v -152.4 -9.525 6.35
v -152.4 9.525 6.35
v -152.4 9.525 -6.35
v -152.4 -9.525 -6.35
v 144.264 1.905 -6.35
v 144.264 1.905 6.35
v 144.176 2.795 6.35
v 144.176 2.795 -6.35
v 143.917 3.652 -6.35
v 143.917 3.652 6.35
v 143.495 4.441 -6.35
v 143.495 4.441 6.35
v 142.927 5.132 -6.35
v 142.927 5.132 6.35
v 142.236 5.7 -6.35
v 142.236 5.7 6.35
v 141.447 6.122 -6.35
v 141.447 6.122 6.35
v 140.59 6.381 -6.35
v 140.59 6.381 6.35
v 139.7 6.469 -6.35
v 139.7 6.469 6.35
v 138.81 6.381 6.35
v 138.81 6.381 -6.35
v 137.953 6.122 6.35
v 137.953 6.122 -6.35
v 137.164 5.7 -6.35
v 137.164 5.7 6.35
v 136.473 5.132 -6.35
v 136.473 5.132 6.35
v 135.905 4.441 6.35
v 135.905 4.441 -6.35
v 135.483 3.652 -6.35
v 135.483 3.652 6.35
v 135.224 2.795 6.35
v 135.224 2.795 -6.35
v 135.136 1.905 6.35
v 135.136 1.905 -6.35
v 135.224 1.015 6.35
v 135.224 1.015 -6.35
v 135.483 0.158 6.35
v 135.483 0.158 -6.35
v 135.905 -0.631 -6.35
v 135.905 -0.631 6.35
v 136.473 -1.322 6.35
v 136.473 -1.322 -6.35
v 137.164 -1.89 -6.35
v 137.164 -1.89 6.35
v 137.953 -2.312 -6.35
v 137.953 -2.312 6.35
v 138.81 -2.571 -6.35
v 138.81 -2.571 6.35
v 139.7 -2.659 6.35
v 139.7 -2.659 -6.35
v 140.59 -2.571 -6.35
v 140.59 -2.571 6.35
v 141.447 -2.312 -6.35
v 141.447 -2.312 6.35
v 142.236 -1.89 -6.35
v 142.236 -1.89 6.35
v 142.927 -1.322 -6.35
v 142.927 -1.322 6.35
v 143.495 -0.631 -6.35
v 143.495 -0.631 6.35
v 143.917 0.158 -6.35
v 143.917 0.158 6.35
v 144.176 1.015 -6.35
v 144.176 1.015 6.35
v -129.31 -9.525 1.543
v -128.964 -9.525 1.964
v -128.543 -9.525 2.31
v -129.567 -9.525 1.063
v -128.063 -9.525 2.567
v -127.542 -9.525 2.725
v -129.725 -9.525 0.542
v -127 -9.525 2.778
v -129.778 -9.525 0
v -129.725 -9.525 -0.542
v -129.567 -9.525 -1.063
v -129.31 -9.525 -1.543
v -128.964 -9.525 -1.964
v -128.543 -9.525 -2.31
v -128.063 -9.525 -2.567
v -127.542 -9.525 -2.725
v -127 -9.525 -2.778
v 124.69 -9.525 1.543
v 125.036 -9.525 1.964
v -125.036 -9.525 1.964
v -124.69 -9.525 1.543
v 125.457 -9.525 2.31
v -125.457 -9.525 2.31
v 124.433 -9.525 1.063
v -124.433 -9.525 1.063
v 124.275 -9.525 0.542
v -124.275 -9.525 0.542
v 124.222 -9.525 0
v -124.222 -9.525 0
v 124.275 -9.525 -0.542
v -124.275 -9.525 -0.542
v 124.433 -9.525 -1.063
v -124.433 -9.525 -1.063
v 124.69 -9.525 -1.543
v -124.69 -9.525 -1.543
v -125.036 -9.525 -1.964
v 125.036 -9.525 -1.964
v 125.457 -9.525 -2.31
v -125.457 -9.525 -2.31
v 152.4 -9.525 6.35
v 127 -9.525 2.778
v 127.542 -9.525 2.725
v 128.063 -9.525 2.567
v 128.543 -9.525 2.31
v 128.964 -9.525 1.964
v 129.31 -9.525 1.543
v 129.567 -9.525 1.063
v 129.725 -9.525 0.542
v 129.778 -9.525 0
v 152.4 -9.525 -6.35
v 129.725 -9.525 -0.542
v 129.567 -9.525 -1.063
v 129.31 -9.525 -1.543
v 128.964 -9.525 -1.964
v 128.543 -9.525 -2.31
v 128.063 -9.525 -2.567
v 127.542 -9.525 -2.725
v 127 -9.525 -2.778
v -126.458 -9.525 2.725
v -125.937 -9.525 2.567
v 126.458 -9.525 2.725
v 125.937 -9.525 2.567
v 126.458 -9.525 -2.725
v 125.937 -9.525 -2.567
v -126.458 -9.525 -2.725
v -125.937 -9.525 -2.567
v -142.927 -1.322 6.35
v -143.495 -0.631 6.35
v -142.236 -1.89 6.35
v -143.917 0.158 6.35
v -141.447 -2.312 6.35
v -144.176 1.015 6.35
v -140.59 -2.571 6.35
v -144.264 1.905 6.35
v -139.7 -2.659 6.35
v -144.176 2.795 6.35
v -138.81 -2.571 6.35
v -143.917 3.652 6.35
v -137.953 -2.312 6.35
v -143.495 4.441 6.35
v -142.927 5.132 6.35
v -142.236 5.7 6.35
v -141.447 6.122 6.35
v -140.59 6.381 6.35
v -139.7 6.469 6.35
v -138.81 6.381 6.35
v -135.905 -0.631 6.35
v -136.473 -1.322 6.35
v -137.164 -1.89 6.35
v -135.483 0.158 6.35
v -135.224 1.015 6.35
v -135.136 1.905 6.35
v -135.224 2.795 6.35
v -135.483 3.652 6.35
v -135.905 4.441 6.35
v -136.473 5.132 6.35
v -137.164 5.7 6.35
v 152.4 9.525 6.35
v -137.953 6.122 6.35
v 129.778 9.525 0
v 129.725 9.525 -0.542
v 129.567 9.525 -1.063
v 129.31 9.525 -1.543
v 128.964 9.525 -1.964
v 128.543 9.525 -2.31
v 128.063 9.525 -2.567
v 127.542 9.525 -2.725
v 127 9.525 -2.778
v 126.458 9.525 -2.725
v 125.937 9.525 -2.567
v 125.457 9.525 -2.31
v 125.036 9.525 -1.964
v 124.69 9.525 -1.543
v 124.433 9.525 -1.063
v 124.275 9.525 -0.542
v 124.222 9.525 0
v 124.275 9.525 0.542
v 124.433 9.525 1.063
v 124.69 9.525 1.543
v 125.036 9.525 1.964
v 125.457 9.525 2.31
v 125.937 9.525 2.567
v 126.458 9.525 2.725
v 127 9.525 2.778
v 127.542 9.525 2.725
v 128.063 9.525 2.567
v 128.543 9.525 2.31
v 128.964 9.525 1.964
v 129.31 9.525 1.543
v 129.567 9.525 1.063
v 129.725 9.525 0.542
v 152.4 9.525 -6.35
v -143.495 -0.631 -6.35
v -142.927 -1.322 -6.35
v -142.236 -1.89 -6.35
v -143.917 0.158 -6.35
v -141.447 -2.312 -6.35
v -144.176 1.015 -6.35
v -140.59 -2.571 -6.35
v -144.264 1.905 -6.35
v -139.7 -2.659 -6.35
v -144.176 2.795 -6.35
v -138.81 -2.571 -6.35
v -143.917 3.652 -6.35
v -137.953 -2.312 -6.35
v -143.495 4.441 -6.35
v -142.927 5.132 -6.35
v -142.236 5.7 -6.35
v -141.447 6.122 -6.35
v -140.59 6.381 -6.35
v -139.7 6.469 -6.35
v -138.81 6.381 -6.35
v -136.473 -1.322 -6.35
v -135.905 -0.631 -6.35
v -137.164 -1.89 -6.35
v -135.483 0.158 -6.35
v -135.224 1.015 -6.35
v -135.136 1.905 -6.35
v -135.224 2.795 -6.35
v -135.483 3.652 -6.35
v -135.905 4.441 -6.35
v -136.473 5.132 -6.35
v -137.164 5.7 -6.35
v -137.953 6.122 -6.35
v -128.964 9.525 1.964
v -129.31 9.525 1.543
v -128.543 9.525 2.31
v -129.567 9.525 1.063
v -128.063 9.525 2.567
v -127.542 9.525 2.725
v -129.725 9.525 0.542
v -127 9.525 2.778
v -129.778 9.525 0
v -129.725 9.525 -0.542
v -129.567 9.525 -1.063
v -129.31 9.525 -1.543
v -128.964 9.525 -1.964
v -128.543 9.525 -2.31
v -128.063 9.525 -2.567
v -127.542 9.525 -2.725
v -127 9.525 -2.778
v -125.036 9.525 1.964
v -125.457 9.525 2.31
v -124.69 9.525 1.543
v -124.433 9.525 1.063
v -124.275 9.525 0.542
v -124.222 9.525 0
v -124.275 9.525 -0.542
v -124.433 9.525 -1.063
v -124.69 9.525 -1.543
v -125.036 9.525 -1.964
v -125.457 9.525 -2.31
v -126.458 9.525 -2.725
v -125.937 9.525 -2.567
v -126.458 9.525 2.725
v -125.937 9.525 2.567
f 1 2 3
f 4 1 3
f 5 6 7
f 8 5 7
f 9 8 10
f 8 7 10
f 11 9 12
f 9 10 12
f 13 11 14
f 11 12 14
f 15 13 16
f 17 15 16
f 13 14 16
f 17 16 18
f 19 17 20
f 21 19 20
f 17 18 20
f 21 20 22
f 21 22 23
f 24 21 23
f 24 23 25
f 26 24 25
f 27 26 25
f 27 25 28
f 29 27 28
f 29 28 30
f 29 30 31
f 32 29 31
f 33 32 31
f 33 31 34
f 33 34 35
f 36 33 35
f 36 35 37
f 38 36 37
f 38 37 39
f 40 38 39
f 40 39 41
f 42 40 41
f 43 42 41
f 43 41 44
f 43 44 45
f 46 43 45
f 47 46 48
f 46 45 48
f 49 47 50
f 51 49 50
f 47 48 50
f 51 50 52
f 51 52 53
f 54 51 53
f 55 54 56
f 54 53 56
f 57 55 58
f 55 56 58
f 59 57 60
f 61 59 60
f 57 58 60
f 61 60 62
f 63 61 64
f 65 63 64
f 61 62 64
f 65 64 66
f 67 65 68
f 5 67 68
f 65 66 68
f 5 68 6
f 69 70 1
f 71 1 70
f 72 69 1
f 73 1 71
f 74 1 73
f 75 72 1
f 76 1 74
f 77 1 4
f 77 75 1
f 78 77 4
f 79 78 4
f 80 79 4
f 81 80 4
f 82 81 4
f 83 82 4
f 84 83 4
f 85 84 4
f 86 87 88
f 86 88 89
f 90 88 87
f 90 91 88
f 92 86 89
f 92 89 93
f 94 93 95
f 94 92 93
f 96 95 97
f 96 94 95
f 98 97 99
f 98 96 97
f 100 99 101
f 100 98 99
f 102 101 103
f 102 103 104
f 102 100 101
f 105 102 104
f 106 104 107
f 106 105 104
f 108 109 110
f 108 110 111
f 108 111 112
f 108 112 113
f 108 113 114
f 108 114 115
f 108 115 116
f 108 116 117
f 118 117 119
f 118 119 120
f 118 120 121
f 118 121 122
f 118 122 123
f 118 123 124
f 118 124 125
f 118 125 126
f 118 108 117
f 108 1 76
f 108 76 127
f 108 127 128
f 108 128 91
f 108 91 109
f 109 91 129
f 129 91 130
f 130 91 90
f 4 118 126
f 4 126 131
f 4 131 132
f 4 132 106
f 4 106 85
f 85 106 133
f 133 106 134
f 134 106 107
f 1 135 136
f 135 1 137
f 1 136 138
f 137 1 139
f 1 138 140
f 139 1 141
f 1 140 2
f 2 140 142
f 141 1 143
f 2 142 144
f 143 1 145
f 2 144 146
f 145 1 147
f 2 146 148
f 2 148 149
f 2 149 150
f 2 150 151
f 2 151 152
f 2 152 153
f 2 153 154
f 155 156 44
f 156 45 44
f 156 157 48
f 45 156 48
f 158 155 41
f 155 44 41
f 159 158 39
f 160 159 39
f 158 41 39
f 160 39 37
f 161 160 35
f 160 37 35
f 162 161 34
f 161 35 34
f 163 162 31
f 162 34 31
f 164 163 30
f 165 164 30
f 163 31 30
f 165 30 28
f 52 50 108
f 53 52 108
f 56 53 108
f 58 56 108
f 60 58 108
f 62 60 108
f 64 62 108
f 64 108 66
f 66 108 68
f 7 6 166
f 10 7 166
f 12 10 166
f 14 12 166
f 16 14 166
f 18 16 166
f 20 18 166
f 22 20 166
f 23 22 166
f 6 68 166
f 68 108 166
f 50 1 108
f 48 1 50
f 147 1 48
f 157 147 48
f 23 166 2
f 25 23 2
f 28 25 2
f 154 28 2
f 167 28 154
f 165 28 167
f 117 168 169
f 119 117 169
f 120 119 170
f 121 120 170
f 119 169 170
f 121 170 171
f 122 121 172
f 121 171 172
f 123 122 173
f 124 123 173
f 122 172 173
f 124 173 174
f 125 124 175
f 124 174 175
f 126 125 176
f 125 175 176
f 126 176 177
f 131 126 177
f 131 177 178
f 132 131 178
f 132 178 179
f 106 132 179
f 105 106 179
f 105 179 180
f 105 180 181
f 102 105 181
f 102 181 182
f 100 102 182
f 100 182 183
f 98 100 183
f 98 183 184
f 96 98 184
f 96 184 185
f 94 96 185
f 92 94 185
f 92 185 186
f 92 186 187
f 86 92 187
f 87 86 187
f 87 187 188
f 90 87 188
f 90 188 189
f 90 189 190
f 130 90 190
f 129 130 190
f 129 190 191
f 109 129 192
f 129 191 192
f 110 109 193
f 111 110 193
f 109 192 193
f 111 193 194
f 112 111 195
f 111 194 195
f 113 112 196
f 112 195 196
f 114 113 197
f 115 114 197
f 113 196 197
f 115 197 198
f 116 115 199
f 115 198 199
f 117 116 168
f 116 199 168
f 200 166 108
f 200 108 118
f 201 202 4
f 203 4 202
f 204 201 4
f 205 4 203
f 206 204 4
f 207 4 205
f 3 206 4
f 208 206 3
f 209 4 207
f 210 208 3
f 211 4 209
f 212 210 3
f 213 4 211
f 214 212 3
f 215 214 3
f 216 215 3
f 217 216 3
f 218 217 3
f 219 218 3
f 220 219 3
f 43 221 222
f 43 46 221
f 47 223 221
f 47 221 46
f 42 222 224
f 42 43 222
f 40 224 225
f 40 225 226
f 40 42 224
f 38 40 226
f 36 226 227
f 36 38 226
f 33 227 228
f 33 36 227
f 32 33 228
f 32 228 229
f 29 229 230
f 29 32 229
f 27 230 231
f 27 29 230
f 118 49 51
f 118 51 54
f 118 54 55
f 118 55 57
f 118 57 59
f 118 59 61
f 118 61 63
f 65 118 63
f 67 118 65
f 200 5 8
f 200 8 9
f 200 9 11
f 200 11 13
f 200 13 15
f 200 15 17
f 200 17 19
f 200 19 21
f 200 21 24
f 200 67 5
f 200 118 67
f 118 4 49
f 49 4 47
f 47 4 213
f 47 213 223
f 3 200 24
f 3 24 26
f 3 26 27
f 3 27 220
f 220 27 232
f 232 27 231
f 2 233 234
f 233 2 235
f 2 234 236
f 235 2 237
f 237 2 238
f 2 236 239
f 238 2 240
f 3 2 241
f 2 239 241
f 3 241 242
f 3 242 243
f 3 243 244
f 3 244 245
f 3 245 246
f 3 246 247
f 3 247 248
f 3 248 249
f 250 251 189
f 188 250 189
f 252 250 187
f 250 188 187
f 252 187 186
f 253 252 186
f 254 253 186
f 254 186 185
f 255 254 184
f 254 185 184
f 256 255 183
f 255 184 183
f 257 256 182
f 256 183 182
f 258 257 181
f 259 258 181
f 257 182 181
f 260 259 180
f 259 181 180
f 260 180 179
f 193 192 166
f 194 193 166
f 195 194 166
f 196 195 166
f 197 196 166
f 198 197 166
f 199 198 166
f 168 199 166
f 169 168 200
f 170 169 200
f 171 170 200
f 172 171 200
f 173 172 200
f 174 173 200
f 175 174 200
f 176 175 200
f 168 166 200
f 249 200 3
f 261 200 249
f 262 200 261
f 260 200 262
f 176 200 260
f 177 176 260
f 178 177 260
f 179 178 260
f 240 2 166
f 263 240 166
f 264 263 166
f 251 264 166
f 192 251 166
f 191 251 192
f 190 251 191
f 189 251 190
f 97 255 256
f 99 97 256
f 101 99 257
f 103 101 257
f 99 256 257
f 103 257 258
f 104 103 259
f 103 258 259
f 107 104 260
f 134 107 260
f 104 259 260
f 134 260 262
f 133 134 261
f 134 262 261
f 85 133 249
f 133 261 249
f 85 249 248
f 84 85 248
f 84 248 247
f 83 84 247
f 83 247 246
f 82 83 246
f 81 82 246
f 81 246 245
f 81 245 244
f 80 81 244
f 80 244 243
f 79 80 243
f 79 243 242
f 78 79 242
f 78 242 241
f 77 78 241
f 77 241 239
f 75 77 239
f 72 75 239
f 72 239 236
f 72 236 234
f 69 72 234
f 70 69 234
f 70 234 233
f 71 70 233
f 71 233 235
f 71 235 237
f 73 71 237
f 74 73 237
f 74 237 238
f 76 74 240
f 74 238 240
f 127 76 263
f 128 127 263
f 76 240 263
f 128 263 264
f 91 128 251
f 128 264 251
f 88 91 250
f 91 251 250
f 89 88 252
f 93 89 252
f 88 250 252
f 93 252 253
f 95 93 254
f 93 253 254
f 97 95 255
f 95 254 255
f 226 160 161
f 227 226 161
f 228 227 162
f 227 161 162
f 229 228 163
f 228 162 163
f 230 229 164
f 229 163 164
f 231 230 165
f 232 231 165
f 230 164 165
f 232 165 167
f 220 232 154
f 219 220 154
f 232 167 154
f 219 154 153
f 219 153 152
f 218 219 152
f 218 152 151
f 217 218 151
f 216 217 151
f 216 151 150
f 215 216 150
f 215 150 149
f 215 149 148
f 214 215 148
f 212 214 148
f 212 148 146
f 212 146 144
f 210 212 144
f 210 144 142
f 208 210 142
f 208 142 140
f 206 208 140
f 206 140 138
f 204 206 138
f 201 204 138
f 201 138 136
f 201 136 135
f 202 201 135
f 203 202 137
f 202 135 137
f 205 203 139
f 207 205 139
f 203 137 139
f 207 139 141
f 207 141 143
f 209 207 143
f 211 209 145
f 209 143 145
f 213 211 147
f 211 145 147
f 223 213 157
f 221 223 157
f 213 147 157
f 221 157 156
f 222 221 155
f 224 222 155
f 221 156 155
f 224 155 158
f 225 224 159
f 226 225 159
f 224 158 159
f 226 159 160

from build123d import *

# Parameters (mm, degrees)
SKETCH1_W               = 12.7
SKETCH1_H               = 19.05
BOSS_EXTRUDE1_DEPTH     = 152.4
SKETCH2_R               = 4.5640625
CUT_EXTRUDE1_DEPTH      = 1
CUT_EXTRUDE1_DEPTH_BACK = 13.7
SKETCH6_R               = 2.778125
CUT_EXTRUDE4_DEPTH      = 1
CUT_EXTRUDE4_DEPTH_BACK = 20.05


with BuildPart() as part:
    # Sketch1 → Boss-Extrude1 (new body, symmetric)
    with BuildSketch(Plane(origin=(0, 0, 0), x_dir=(0, 0, -1), z_dir=(1, 0, 0))):
        Rectangle(SKETCH1_W, SKETCH1_H)
    extrude(amount=BOSS_EXTRUDE1_DEPTH, both=True)

    # Sketch2 → Cut-Extrude1 (cut, two sides)
    with BuildSketch(Plane.XY.offset(6.35)) as cut_extrude1_sk:
        with Locations((139.7, 1.905)):
            Circle(SKETCH2_R)
        with Locations((-139.7, 1.905)):
            Circle(SKETCH2_R)
    extrude(amount=CUT_EXTRUDE1_DEPTH, mode=Mode.SUBTRACT)
    extrude(cut_extrude1_sk.sketch, amount=-CUT_EXTRUDE1_DEPTH_BACK, mode=Mode.SUBTRACT)

    # Sketch6 → Cut-Extrude4 (cut, two sides)
    with BuildSketch(Plane(origin=(0, 9.525, 0), x_dir=(1, 0, 0), z_dir=(0, 1, 0))) as cut_extrude4_sk:
        with Locations((-127, 0)):
            Circle(SKETCH6_R)
        with Locations((127, 0)):
            Circle(SKETCH6_R)
    extrude(amount=CUT_EXTRUDE4_DEPTH, mode=Mode.SUBTRACT)
    extrude(cut_extrude4_sk.sketch, amount=-CUT_EXTRUDE4_DEPTH_BACK, mode=Mode.SUBTRACT)


solid = part.part
